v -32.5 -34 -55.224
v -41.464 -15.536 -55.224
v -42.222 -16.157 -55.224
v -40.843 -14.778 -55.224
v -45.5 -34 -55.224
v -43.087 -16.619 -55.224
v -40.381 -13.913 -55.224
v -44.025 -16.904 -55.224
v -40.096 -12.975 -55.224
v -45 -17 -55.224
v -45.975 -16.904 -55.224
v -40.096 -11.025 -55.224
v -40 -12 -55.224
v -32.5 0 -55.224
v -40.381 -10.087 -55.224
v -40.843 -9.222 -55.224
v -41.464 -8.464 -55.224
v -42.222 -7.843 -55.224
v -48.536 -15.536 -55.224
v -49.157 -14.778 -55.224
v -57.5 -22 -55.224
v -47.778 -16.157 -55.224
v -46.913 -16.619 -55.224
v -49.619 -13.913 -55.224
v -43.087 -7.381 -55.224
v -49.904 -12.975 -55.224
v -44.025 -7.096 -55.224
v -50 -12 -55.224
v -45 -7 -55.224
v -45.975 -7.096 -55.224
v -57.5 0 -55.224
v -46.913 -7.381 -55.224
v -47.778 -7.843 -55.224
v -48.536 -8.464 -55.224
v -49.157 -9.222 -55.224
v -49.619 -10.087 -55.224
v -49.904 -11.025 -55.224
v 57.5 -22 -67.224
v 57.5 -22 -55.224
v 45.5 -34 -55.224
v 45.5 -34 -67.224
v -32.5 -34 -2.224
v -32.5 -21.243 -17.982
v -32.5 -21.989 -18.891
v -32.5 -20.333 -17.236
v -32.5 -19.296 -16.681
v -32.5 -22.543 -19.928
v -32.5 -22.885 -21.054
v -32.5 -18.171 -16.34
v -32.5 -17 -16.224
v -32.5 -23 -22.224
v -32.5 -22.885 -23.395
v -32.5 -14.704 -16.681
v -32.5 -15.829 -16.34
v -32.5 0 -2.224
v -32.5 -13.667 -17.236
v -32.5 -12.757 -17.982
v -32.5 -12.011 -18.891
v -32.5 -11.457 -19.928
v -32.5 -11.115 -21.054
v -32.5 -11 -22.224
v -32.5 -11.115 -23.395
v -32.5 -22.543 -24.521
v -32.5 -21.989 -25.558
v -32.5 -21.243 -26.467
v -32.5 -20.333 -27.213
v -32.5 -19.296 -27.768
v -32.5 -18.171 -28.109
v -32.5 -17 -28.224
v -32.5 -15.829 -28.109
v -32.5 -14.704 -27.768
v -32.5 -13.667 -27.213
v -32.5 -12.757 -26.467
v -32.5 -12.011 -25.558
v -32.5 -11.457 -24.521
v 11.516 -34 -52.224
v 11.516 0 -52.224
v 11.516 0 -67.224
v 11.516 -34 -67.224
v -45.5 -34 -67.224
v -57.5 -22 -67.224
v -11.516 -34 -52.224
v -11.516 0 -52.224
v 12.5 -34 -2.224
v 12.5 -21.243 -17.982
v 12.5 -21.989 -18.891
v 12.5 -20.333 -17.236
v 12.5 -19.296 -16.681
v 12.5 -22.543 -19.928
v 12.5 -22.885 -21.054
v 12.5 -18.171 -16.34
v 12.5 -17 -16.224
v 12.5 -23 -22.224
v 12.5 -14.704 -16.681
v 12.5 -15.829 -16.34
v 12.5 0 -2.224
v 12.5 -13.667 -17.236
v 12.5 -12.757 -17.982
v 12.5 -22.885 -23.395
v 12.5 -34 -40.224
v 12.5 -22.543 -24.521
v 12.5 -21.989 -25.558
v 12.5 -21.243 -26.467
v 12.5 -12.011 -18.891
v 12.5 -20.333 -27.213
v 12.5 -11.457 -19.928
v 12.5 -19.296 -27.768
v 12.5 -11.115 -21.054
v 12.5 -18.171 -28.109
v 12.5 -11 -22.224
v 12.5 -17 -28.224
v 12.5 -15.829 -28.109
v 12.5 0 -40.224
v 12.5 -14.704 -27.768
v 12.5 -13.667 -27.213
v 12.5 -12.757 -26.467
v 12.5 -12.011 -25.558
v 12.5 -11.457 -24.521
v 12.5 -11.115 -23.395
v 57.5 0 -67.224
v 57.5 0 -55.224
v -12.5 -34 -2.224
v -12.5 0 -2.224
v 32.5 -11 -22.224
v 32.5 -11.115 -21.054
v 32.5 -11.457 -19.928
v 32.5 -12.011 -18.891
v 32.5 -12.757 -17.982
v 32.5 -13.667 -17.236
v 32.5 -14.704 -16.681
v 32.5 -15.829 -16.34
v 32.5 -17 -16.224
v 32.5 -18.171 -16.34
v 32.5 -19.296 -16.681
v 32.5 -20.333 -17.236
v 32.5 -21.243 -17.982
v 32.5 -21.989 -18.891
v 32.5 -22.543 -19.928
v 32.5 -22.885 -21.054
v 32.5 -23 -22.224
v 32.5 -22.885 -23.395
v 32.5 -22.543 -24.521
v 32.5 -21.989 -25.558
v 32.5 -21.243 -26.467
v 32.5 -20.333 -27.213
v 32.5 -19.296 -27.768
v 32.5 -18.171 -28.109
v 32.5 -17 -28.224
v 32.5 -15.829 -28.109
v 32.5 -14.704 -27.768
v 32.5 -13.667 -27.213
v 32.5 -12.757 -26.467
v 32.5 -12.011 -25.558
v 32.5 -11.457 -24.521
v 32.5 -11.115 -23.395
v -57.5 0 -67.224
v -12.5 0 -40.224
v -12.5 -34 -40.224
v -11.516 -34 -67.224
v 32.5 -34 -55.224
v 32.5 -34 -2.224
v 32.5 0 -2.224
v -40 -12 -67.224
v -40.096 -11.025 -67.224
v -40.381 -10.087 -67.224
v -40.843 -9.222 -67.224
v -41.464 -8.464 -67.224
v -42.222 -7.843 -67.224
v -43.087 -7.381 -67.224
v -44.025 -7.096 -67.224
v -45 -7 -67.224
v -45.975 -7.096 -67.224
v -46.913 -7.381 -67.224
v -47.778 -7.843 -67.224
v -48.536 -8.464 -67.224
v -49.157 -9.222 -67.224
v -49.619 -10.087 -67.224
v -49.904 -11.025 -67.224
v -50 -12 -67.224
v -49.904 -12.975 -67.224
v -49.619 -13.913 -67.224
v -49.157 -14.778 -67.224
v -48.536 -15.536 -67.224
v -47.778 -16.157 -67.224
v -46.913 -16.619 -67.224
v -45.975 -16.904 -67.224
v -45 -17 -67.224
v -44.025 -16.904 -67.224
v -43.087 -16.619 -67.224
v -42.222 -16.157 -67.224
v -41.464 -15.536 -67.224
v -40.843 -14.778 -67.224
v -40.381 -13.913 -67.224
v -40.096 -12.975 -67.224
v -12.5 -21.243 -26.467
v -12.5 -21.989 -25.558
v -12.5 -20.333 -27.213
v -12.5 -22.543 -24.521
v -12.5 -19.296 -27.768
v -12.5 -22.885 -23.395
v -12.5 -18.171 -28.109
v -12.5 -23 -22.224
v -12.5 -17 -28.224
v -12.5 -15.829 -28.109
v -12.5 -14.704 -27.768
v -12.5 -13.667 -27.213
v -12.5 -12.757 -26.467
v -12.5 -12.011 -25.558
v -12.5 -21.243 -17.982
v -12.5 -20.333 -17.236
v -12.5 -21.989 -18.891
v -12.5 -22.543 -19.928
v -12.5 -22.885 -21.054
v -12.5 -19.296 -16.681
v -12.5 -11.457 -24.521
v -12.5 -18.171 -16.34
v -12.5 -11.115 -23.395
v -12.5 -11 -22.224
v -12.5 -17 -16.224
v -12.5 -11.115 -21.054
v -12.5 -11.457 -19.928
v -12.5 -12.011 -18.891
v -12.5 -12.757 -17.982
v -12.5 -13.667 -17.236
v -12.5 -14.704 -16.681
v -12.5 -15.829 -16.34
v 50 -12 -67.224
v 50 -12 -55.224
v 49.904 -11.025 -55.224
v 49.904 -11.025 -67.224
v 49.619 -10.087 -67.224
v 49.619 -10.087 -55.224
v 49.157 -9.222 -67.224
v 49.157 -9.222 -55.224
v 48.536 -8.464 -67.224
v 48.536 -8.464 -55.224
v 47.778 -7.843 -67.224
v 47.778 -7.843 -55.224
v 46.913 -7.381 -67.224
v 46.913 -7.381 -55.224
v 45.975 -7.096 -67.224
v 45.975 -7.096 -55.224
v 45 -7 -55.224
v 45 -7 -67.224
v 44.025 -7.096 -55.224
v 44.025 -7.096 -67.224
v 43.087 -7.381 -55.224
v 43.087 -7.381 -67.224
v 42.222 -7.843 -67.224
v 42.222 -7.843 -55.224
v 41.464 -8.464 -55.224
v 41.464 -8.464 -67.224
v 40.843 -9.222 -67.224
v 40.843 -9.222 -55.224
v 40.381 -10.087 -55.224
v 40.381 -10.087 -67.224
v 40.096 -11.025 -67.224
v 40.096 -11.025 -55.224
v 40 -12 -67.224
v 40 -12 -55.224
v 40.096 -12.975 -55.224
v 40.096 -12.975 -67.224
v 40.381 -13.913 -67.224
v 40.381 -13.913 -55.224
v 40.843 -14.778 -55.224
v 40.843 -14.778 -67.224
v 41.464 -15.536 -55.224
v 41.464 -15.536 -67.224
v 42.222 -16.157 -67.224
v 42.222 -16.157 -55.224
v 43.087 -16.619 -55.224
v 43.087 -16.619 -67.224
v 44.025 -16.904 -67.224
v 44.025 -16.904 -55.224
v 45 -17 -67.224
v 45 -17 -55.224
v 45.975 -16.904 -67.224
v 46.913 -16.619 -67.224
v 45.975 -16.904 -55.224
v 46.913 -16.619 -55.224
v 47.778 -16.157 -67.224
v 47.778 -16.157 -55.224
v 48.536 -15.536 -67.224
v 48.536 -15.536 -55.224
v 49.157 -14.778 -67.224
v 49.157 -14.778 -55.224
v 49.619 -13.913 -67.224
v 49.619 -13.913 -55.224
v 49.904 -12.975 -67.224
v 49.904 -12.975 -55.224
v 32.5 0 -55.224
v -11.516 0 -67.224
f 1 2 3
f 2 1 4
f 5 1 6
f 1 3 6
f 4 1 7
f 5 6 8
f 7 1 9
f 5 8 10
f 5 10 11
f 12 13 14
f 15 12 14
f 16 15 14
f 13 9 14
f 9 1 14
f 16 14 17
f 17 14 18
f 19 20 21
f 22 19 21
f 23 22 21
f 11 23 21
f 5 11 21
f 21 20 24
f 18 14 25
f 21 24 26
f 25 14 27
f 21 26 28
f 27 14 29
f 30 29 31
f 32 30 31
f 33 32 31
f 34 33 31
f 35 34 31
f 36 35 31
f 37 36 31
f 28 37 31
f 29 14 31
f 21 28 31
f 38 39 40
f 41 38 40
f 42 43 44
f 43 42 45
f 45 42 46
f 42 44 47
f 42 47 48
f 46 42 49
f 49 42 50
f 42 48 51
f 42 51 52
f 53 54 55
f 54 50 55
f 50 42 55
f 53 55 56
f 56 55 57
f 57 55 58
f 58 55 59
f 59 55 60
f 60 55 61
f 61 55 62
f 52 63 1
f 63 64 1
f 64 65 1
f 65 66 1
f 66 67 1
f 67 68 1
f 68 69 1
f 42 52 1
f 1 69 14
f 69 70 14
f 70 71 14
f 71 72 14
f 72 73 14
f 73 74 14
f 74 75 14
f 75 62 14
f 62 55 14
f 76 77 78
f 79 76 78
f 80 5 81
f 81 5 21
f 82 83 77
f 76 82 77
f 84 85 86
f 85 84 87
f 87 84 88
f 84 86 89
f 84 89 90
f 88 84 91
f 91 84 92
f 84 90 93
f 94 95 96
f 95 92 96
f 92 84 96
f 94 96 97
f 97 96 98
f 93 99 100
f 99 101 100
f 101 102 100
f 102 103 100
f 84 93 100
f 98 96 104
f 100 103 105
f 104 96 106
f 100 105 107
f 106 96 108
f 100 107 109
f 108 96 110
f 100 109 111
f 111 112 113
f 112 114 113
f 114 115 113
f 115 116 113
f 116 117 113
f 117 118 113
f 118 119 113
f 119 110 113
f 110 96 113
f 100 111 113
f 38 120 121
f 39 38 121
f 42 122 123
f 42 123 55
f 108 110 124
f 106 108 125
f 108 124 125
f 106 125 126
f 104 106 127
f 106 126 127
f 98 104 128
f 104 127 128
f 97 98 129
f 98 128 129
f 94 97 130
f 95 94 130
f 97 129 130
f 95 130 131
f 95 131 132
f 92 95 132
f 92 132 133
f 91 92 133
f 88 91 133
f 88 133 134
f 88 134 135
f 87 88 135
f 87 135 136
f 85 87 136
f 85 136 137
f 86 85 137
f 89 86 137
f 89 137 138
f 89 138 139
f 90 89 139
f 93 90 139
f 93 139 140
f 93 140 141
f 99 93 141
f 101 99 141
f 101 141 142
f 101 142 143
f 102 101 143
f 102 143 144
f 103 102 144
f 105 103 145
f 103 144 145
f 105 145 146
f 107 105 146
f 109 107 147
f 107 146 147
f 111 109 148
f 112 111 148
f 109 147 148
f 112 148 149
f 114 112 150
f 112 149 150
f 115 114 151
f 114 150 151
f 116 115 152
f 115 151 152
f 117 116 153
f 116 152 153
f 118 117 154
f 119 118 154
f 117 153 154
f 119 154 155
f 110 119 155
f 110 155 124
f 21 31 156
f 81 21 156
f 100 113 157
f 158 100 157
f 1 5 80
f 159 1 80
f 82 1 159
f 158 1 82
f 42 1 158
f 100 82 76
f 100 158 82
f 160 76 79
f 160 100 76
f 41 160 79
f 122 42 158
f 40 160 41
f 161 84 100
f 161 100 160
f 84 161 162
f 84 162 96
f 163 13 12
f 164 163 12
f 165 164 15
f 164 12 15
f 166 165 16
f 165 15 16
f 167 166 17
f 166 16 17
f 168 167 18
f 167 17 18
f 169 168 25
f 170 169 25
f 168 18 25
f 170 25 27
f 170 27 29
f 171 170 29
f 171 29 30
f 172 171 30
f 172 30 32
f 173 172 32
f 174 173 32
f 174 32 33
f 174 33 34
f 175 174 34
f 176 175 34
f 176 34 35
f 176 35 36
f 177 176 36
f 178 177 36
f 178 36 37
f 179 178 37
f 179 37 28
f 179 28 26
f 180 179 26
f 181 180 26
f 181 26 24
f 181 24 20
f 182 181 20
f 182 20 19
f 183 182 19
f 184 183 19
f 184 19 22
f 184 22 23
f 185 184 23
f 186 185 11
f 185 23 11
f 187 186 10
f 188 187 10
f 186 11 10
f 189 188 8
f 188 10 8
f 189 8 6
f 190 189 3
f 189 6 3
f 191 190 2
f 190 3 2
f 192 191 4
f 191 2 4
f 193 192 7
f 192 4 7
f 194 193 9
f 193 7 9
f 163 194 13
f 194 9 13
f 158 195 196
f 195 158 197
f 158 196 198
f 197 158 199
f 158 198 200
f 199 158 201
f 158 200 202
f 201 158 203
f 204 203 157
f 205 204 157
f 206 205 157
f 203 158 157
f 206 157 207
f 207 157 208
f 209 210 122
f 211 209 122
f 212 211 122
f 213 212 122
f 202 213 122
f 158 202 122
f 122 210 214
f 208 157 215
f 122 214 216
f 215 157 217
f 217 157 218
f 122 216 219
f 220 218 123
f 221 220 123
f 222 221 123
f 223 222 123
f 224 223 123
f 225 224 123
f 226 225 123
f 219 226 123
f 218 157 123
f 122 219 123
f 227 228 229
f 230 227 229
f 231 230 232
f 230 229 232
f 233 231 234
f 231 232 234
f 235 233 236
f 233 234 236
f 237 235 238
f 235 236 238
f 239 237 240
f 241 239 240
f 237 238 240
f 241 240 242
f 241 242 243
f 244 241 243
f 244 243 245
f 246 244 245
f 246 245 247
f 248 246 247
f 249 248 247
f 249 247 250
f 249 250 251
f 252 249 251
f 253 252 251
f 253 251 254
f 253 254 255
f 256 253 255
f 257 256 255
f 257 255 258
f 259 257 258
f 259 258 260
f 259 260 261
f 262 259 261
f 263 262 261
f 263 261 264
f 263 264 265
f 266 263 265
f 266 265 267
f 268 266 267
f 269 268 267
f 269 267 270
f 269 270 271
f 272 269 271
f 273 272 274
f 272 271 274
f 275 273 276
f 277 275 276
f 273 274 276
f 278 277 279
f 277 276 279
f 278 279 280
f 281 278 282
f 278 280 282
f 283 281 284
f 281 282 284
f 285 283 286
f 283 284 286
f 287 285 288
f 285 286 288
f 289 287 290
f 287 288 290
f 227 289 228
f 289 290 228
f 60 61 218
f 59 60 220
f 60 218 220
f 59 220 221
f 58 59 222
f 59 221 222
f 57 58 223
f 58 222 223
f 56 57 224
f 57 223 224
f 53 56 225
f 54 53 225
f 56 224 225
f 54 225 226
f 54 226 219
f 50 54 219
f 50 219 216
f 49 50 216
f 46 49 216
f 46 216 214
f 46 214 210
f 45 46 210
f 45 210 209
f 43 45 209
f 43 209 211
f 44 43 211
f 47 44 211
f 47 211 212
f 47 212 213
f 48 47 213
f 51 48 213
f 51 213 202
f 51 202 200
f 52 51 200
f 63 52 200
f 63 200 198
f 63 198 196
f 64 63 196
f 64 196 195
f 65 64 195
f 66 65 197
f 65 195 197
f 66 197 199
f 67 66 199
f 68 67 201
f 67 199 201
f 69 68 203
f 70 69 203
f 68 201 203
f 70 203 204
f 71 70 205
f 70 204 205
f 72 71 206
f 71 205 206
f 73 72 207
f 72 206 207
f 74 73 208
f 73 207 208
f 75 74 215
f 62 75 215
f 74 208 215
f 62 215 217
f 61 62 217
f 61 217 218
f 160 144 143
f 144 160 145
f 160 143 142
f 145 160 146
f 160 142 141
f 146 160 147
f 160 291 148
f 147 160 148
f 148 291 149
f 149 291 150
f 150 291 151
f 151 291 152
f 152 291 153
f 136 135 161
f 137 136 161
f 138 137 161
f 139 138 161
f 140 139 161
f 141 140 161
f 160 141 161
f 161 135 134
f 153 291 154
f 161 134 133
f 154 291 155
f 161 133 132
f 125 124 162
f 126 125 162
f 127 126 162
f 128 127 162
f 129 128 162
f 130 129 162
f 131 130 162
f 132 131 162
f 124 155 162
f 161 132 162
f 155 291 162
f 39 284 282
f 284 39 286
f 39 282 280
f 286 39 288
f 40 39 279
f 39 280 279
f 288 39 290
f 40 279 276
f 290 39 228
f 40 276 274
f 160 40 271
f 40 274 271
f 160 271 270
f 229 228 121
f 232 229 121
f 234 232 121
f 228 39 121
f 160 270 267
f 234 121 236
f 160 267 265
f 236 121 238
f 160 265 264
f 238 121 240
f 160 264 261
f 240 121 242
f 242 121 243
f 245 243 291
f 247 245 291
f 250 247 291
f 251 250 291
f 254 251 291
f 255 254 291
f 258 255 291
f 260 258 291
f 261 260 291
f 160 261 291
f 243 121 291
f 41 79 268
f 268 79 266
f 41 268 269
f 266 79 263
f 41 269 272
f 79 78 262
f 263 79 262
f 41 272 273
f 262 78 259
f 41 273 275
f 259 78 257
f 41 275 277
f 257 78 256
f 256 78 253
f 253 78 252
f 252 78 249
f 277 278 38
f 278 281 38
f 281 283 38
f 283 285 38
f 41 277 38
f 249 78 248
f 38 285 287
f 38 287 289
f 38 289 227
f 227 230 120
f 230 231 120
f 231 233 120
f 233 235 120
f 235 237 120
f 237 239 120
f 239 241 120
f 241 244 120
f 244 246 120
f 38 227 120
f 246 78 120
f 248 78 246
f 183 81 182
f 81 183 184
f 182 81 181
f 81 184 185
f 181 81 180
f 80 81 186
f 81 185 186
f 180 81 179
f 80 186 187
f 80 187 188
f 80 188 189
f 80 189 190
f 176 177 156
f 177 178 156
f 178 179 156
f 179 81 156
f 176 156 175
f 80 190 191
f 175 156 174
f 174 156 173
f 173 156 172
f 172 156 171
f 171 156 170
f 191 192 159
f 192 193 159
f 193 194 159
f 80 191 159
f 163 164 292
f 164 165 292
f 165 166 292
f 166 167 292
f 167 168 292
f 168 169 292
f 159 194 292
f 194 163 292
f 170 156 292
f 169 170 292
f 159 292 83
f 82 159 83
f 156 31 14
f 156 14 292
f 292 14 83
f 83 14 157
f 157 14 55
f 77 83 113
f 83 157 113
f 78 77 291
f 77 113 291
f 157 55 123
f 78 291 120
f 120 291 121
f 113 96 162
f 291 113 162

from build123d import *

# Parameters (mm, degrees)
F1_DEPTH = 34
F2_R     = 6
F3_DEPTH = 90.001
F4_R     = 5
F5_DEPTH = 67.22541
F7_DEPTH = 67.22541


with BuildPart() as f1:
    # F0 (on Front) → F1 (new body)
    with BuildSketch(Plane.XZ):
        Polygon((-12.5, -2.22441), (-32.5, -2.22441), (-32.5, -55.22441), (-57.5, -55.22441), (-57.5, -67.22441), (-11.515748, -67.22441), (-11.515748, -52.22441), (0, -52.22441), (11.515748, -52.22441), (11.515748, -67.22441), (57.5, -67.22441), (57.5, -55.22441), (32.5, -55.22441), (32.5, -2.22441), (12.5, -2.22441), (12.5, -40.22441), (0, -40.22441), (-12.5, -40.22441), align=None)
    extrude(amount=F1_DEPTH)

    # F2 (on face) → F3 (cut, through all)
    with BuildSketch(Plane.YZ.offset(32.5)):
        with Locations((-17, -22.22441)):
            Circle(F2_R)
    extrude(amount=-F3_DEPTH, mode=Mode.SUBTRACT)

    # F4 (on Top) → F5 (cut, through all)
    with BuildSketch(Plane.XY):
        with Locations((-45, -12)):
            Circle(F4_R)
        with Locations((45, -12)):
            Circle(F4_R)
    extrude(amount=-F5_DEPTH, mode=Mode.SUBTRACT)

    # F6 (on Top) → F7 (cut, through all)
    with BuildSketch(Plane.XY):
        Polygon((57.5, -34), (57.5, -22), (45.5, -34), align=None)
        Polygon((-45.5, -34), (-57.5, -22), (-57.5, -34), align=None)
    extrude(amount=-F7_DEPTH, mode=Mode.SUBTRACT)


solid = f1.part
